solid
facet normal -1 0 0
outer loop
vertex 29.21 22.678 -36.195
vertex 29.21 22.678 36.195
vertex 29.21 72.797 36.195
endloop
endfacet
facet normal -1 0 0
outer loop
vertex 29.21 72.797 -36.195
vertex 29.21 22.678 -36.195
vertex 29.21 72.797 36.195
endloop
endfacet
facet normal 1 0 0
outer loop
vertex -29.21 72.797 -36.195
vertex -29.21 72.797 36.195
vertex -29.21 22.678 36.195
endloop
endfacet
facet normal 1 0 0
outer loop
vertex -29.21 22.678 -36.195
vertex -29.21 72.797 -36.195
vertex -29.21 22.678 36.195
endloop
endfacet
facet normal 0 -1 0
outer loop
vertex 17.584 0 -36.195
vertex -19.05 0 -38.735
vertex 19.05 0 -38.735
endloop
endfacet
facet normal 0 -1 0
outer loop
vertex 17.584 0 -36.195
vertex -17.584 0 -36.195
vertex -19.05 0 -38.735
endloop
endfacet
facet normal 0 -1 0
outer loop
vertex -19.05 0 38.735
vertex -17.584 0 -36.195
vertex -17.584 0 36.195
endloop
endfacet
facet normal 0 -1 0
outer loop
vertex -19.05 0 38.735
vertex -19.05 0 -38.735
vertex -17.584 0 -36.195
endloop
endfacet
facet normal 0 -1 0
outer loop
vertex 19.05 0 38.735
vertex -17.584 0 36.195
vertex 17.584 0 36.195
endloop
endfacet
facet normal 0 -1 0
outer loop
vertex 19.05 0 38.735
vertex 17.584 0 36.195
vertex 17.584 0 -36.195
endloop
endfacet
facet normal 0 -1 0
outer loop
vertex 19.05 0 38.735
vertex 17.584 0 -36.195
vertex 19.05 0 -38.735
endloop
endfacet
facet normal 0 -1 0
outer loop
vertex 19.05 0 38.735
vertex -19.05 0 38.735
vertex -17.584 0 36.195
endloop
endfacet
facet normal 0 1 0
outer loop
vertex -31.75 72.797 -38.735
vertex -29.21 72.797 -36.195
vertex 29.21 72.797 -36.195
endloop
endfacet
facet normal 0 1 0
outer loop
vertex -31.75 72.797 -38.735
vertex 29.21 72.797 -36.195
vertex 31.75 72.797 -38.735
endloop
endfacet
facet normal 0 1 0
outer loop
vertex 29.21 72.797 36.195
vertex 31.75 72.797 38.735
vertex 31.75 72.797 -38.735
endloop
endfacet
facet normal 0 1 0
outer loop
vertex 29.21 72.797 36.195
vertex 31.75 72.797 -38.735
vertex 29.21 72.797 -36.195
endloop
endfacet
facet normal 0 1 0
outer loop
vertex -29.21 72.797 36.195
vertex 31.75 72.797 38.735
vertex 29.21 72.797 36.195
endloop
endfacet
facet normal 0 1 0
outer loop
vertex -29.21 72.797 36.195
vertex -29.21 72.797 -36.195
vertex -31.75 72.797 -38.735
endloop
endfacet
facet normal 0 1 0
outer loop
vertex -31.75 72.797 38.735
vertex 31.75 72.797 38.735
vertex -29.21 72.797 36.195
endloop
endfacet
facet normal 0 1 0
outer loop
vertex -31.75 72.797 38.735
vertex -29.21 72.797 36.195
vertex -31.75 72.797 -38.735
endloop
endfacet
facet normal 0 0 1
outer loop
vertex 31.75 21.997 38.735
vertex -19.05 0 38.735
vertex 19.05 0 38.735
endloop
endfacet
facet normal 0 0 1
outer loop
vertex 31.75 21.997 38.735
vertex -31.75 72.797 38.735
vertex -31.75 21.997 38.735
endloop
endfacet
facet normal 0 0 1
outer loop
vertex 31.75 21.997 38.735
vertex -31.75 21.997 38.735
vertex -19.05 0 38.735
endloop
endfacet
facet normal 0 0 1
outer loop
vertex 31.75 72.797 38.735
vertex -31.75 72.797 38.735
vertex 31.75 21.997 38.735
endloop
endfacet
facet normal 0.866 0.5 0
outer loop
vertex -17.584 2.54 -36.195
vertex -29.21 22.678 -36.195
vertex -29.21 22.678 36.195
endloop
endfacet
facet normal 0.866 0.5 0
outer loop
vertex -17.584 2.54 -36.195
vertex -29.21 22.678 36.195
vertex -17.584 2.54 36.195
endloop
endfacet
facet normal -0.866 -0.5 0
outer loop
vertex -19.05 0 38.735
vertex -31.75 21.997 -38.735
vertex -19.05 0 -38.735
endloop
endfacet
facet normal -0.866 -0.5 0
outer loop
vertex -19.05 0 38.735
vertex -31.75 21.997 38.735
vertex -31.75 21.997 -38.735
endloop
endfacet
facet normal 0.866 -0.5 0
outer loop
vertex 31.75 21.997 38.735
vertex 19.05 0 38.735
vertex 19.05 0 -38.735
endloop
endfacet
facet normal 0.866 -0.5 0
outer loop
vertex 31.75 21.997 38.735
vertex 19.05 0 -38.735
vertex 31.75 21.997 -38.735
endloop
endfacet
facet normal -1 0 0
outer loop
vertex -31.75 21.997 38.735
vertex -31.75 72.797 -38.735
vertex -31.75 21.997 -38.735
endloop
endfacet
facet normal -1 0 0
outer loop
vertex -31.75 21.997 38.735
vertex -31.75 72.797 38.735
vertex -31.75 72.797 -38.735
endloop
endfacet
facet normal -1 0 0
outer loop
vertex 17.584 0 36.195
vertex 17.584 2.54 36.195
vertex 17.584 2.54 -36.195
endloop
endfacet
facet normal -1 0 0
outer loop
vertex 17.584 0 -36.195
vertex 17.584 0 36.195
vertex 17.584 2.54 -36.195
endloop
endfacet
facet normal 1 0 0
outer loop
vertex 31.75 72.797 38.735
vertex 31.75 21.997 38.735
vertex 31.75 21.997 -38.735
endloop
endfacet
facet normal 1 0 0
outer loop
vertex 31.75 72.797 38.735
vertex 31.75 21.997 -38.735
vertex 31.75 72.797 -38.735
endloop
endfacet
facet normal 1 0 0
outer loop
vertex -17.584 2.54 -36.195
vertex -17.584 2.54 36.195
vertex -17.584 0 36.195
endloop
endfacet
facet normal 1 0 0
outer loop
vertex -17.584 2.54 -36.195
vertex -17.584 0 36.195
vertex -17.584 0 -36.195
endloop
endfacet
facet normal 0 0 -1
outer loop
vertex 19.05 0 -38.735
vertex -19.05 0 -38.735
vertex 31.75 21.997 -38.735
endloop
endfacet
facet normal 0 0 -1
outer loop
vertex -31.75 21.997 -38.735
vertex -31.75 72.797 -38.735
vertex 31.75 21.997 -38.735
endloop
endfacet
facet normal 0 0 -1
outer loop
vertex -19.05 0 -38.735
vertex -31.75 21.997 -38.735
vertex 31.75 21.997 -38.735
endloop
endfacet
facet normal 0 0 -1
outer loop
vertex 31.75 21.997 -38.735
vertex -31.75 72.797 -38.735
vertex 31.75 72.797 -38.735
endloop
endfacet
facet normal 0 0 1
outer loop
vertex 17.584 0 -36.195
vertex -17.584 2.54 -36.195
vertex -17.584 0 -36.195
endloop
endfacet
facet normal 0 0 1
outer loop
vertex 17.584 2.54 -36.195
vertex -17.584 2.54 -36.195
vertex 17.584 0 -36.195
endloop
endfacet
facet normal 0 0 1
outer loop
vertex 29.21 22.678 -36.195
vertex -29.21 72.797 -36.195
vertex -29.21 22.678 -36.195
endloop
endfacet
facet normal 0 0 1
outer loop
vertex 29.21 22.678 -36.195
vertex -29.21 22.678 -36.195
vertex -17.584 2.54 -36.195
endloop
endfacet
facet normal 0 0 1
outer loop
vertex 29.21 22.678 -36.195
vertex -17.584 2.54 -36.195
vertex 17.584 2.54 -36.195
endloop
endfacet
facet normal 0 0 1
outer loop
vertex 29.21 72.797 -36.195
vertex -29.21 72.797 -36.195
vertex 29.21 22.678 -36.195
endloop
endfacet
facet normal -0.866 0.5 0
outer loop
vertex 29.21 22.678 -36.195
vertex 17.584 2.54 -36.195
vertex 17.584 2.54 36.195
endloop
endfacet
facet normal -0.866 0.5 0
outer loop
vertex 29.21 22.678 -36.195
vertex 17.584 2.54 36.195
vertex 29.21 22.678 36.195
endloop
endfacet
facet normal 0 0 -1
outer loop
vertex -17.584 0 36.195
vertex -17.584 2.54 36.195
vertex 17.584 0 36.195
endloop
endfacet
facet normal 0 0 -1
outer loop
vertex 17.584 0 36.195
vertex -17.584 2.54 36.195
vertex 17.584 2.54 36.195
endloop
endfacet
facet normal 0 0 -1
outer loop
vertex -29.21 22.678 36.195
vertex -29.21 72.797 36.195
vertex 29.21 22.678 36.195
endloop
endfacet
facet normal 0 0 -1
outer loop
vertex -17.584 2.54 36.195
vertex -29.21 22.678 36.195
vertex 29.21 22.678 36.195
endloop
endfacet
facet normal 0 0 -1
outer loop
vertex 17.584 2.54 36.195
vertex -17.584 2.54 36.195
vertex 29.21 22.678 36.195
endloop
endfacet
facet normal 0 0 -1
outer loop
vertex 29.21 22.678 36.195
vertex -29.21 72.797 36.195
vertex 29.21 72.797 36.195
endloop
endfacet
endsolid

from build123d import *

# Parameters (mm, degrees)
BOSS_EXTRUDE1_DEPTH = 38.735
SHELL1_T            = -2.54
SKETCH4_W           = 35.167060632
SKETCH4_H           = 72.39
CUT_EXTRUDE1_DEPTH  = 87.281603677


with BuildPart() as part:
    # Sketch1 → Boss-Extrude1 (new, symmetric)
    with BuildSketch(Plane.XY):
        Polygon((-19.05, 0), (19.05, 0), (31.75, 21.997045256), (31.75, 72.797045256), (-31.75, 72.797045256), (-31.75, 21.997045256), align=None)
    extrude(amount=BOSS_EXTRUDE1_DEPTH, both=True)

    # Shell1
    shell1_openings = [part.faces().sort_by_distance(p)[0] for p in [
        (0, 72.797045256, 0),
    ]]
    offset(amount=SHELL1_T, openings=shell1_openings, kind=Kind.INTERSECTION)

    # Sketch4 → Cut-Extrude1 (cut, through all)
    with BuildSketch(Plane(origin=(0, 2.54, 0), x_dir=(1, 0, 0), z_dir=(0, 1, 0))):
        Rectangle(SKETCH4_W, SKETCH4_H)
    extrude(amount=-CUT_EXTRUDE1_DEPTH, mode=Mode.SUBTRACT)


solid = part.part
